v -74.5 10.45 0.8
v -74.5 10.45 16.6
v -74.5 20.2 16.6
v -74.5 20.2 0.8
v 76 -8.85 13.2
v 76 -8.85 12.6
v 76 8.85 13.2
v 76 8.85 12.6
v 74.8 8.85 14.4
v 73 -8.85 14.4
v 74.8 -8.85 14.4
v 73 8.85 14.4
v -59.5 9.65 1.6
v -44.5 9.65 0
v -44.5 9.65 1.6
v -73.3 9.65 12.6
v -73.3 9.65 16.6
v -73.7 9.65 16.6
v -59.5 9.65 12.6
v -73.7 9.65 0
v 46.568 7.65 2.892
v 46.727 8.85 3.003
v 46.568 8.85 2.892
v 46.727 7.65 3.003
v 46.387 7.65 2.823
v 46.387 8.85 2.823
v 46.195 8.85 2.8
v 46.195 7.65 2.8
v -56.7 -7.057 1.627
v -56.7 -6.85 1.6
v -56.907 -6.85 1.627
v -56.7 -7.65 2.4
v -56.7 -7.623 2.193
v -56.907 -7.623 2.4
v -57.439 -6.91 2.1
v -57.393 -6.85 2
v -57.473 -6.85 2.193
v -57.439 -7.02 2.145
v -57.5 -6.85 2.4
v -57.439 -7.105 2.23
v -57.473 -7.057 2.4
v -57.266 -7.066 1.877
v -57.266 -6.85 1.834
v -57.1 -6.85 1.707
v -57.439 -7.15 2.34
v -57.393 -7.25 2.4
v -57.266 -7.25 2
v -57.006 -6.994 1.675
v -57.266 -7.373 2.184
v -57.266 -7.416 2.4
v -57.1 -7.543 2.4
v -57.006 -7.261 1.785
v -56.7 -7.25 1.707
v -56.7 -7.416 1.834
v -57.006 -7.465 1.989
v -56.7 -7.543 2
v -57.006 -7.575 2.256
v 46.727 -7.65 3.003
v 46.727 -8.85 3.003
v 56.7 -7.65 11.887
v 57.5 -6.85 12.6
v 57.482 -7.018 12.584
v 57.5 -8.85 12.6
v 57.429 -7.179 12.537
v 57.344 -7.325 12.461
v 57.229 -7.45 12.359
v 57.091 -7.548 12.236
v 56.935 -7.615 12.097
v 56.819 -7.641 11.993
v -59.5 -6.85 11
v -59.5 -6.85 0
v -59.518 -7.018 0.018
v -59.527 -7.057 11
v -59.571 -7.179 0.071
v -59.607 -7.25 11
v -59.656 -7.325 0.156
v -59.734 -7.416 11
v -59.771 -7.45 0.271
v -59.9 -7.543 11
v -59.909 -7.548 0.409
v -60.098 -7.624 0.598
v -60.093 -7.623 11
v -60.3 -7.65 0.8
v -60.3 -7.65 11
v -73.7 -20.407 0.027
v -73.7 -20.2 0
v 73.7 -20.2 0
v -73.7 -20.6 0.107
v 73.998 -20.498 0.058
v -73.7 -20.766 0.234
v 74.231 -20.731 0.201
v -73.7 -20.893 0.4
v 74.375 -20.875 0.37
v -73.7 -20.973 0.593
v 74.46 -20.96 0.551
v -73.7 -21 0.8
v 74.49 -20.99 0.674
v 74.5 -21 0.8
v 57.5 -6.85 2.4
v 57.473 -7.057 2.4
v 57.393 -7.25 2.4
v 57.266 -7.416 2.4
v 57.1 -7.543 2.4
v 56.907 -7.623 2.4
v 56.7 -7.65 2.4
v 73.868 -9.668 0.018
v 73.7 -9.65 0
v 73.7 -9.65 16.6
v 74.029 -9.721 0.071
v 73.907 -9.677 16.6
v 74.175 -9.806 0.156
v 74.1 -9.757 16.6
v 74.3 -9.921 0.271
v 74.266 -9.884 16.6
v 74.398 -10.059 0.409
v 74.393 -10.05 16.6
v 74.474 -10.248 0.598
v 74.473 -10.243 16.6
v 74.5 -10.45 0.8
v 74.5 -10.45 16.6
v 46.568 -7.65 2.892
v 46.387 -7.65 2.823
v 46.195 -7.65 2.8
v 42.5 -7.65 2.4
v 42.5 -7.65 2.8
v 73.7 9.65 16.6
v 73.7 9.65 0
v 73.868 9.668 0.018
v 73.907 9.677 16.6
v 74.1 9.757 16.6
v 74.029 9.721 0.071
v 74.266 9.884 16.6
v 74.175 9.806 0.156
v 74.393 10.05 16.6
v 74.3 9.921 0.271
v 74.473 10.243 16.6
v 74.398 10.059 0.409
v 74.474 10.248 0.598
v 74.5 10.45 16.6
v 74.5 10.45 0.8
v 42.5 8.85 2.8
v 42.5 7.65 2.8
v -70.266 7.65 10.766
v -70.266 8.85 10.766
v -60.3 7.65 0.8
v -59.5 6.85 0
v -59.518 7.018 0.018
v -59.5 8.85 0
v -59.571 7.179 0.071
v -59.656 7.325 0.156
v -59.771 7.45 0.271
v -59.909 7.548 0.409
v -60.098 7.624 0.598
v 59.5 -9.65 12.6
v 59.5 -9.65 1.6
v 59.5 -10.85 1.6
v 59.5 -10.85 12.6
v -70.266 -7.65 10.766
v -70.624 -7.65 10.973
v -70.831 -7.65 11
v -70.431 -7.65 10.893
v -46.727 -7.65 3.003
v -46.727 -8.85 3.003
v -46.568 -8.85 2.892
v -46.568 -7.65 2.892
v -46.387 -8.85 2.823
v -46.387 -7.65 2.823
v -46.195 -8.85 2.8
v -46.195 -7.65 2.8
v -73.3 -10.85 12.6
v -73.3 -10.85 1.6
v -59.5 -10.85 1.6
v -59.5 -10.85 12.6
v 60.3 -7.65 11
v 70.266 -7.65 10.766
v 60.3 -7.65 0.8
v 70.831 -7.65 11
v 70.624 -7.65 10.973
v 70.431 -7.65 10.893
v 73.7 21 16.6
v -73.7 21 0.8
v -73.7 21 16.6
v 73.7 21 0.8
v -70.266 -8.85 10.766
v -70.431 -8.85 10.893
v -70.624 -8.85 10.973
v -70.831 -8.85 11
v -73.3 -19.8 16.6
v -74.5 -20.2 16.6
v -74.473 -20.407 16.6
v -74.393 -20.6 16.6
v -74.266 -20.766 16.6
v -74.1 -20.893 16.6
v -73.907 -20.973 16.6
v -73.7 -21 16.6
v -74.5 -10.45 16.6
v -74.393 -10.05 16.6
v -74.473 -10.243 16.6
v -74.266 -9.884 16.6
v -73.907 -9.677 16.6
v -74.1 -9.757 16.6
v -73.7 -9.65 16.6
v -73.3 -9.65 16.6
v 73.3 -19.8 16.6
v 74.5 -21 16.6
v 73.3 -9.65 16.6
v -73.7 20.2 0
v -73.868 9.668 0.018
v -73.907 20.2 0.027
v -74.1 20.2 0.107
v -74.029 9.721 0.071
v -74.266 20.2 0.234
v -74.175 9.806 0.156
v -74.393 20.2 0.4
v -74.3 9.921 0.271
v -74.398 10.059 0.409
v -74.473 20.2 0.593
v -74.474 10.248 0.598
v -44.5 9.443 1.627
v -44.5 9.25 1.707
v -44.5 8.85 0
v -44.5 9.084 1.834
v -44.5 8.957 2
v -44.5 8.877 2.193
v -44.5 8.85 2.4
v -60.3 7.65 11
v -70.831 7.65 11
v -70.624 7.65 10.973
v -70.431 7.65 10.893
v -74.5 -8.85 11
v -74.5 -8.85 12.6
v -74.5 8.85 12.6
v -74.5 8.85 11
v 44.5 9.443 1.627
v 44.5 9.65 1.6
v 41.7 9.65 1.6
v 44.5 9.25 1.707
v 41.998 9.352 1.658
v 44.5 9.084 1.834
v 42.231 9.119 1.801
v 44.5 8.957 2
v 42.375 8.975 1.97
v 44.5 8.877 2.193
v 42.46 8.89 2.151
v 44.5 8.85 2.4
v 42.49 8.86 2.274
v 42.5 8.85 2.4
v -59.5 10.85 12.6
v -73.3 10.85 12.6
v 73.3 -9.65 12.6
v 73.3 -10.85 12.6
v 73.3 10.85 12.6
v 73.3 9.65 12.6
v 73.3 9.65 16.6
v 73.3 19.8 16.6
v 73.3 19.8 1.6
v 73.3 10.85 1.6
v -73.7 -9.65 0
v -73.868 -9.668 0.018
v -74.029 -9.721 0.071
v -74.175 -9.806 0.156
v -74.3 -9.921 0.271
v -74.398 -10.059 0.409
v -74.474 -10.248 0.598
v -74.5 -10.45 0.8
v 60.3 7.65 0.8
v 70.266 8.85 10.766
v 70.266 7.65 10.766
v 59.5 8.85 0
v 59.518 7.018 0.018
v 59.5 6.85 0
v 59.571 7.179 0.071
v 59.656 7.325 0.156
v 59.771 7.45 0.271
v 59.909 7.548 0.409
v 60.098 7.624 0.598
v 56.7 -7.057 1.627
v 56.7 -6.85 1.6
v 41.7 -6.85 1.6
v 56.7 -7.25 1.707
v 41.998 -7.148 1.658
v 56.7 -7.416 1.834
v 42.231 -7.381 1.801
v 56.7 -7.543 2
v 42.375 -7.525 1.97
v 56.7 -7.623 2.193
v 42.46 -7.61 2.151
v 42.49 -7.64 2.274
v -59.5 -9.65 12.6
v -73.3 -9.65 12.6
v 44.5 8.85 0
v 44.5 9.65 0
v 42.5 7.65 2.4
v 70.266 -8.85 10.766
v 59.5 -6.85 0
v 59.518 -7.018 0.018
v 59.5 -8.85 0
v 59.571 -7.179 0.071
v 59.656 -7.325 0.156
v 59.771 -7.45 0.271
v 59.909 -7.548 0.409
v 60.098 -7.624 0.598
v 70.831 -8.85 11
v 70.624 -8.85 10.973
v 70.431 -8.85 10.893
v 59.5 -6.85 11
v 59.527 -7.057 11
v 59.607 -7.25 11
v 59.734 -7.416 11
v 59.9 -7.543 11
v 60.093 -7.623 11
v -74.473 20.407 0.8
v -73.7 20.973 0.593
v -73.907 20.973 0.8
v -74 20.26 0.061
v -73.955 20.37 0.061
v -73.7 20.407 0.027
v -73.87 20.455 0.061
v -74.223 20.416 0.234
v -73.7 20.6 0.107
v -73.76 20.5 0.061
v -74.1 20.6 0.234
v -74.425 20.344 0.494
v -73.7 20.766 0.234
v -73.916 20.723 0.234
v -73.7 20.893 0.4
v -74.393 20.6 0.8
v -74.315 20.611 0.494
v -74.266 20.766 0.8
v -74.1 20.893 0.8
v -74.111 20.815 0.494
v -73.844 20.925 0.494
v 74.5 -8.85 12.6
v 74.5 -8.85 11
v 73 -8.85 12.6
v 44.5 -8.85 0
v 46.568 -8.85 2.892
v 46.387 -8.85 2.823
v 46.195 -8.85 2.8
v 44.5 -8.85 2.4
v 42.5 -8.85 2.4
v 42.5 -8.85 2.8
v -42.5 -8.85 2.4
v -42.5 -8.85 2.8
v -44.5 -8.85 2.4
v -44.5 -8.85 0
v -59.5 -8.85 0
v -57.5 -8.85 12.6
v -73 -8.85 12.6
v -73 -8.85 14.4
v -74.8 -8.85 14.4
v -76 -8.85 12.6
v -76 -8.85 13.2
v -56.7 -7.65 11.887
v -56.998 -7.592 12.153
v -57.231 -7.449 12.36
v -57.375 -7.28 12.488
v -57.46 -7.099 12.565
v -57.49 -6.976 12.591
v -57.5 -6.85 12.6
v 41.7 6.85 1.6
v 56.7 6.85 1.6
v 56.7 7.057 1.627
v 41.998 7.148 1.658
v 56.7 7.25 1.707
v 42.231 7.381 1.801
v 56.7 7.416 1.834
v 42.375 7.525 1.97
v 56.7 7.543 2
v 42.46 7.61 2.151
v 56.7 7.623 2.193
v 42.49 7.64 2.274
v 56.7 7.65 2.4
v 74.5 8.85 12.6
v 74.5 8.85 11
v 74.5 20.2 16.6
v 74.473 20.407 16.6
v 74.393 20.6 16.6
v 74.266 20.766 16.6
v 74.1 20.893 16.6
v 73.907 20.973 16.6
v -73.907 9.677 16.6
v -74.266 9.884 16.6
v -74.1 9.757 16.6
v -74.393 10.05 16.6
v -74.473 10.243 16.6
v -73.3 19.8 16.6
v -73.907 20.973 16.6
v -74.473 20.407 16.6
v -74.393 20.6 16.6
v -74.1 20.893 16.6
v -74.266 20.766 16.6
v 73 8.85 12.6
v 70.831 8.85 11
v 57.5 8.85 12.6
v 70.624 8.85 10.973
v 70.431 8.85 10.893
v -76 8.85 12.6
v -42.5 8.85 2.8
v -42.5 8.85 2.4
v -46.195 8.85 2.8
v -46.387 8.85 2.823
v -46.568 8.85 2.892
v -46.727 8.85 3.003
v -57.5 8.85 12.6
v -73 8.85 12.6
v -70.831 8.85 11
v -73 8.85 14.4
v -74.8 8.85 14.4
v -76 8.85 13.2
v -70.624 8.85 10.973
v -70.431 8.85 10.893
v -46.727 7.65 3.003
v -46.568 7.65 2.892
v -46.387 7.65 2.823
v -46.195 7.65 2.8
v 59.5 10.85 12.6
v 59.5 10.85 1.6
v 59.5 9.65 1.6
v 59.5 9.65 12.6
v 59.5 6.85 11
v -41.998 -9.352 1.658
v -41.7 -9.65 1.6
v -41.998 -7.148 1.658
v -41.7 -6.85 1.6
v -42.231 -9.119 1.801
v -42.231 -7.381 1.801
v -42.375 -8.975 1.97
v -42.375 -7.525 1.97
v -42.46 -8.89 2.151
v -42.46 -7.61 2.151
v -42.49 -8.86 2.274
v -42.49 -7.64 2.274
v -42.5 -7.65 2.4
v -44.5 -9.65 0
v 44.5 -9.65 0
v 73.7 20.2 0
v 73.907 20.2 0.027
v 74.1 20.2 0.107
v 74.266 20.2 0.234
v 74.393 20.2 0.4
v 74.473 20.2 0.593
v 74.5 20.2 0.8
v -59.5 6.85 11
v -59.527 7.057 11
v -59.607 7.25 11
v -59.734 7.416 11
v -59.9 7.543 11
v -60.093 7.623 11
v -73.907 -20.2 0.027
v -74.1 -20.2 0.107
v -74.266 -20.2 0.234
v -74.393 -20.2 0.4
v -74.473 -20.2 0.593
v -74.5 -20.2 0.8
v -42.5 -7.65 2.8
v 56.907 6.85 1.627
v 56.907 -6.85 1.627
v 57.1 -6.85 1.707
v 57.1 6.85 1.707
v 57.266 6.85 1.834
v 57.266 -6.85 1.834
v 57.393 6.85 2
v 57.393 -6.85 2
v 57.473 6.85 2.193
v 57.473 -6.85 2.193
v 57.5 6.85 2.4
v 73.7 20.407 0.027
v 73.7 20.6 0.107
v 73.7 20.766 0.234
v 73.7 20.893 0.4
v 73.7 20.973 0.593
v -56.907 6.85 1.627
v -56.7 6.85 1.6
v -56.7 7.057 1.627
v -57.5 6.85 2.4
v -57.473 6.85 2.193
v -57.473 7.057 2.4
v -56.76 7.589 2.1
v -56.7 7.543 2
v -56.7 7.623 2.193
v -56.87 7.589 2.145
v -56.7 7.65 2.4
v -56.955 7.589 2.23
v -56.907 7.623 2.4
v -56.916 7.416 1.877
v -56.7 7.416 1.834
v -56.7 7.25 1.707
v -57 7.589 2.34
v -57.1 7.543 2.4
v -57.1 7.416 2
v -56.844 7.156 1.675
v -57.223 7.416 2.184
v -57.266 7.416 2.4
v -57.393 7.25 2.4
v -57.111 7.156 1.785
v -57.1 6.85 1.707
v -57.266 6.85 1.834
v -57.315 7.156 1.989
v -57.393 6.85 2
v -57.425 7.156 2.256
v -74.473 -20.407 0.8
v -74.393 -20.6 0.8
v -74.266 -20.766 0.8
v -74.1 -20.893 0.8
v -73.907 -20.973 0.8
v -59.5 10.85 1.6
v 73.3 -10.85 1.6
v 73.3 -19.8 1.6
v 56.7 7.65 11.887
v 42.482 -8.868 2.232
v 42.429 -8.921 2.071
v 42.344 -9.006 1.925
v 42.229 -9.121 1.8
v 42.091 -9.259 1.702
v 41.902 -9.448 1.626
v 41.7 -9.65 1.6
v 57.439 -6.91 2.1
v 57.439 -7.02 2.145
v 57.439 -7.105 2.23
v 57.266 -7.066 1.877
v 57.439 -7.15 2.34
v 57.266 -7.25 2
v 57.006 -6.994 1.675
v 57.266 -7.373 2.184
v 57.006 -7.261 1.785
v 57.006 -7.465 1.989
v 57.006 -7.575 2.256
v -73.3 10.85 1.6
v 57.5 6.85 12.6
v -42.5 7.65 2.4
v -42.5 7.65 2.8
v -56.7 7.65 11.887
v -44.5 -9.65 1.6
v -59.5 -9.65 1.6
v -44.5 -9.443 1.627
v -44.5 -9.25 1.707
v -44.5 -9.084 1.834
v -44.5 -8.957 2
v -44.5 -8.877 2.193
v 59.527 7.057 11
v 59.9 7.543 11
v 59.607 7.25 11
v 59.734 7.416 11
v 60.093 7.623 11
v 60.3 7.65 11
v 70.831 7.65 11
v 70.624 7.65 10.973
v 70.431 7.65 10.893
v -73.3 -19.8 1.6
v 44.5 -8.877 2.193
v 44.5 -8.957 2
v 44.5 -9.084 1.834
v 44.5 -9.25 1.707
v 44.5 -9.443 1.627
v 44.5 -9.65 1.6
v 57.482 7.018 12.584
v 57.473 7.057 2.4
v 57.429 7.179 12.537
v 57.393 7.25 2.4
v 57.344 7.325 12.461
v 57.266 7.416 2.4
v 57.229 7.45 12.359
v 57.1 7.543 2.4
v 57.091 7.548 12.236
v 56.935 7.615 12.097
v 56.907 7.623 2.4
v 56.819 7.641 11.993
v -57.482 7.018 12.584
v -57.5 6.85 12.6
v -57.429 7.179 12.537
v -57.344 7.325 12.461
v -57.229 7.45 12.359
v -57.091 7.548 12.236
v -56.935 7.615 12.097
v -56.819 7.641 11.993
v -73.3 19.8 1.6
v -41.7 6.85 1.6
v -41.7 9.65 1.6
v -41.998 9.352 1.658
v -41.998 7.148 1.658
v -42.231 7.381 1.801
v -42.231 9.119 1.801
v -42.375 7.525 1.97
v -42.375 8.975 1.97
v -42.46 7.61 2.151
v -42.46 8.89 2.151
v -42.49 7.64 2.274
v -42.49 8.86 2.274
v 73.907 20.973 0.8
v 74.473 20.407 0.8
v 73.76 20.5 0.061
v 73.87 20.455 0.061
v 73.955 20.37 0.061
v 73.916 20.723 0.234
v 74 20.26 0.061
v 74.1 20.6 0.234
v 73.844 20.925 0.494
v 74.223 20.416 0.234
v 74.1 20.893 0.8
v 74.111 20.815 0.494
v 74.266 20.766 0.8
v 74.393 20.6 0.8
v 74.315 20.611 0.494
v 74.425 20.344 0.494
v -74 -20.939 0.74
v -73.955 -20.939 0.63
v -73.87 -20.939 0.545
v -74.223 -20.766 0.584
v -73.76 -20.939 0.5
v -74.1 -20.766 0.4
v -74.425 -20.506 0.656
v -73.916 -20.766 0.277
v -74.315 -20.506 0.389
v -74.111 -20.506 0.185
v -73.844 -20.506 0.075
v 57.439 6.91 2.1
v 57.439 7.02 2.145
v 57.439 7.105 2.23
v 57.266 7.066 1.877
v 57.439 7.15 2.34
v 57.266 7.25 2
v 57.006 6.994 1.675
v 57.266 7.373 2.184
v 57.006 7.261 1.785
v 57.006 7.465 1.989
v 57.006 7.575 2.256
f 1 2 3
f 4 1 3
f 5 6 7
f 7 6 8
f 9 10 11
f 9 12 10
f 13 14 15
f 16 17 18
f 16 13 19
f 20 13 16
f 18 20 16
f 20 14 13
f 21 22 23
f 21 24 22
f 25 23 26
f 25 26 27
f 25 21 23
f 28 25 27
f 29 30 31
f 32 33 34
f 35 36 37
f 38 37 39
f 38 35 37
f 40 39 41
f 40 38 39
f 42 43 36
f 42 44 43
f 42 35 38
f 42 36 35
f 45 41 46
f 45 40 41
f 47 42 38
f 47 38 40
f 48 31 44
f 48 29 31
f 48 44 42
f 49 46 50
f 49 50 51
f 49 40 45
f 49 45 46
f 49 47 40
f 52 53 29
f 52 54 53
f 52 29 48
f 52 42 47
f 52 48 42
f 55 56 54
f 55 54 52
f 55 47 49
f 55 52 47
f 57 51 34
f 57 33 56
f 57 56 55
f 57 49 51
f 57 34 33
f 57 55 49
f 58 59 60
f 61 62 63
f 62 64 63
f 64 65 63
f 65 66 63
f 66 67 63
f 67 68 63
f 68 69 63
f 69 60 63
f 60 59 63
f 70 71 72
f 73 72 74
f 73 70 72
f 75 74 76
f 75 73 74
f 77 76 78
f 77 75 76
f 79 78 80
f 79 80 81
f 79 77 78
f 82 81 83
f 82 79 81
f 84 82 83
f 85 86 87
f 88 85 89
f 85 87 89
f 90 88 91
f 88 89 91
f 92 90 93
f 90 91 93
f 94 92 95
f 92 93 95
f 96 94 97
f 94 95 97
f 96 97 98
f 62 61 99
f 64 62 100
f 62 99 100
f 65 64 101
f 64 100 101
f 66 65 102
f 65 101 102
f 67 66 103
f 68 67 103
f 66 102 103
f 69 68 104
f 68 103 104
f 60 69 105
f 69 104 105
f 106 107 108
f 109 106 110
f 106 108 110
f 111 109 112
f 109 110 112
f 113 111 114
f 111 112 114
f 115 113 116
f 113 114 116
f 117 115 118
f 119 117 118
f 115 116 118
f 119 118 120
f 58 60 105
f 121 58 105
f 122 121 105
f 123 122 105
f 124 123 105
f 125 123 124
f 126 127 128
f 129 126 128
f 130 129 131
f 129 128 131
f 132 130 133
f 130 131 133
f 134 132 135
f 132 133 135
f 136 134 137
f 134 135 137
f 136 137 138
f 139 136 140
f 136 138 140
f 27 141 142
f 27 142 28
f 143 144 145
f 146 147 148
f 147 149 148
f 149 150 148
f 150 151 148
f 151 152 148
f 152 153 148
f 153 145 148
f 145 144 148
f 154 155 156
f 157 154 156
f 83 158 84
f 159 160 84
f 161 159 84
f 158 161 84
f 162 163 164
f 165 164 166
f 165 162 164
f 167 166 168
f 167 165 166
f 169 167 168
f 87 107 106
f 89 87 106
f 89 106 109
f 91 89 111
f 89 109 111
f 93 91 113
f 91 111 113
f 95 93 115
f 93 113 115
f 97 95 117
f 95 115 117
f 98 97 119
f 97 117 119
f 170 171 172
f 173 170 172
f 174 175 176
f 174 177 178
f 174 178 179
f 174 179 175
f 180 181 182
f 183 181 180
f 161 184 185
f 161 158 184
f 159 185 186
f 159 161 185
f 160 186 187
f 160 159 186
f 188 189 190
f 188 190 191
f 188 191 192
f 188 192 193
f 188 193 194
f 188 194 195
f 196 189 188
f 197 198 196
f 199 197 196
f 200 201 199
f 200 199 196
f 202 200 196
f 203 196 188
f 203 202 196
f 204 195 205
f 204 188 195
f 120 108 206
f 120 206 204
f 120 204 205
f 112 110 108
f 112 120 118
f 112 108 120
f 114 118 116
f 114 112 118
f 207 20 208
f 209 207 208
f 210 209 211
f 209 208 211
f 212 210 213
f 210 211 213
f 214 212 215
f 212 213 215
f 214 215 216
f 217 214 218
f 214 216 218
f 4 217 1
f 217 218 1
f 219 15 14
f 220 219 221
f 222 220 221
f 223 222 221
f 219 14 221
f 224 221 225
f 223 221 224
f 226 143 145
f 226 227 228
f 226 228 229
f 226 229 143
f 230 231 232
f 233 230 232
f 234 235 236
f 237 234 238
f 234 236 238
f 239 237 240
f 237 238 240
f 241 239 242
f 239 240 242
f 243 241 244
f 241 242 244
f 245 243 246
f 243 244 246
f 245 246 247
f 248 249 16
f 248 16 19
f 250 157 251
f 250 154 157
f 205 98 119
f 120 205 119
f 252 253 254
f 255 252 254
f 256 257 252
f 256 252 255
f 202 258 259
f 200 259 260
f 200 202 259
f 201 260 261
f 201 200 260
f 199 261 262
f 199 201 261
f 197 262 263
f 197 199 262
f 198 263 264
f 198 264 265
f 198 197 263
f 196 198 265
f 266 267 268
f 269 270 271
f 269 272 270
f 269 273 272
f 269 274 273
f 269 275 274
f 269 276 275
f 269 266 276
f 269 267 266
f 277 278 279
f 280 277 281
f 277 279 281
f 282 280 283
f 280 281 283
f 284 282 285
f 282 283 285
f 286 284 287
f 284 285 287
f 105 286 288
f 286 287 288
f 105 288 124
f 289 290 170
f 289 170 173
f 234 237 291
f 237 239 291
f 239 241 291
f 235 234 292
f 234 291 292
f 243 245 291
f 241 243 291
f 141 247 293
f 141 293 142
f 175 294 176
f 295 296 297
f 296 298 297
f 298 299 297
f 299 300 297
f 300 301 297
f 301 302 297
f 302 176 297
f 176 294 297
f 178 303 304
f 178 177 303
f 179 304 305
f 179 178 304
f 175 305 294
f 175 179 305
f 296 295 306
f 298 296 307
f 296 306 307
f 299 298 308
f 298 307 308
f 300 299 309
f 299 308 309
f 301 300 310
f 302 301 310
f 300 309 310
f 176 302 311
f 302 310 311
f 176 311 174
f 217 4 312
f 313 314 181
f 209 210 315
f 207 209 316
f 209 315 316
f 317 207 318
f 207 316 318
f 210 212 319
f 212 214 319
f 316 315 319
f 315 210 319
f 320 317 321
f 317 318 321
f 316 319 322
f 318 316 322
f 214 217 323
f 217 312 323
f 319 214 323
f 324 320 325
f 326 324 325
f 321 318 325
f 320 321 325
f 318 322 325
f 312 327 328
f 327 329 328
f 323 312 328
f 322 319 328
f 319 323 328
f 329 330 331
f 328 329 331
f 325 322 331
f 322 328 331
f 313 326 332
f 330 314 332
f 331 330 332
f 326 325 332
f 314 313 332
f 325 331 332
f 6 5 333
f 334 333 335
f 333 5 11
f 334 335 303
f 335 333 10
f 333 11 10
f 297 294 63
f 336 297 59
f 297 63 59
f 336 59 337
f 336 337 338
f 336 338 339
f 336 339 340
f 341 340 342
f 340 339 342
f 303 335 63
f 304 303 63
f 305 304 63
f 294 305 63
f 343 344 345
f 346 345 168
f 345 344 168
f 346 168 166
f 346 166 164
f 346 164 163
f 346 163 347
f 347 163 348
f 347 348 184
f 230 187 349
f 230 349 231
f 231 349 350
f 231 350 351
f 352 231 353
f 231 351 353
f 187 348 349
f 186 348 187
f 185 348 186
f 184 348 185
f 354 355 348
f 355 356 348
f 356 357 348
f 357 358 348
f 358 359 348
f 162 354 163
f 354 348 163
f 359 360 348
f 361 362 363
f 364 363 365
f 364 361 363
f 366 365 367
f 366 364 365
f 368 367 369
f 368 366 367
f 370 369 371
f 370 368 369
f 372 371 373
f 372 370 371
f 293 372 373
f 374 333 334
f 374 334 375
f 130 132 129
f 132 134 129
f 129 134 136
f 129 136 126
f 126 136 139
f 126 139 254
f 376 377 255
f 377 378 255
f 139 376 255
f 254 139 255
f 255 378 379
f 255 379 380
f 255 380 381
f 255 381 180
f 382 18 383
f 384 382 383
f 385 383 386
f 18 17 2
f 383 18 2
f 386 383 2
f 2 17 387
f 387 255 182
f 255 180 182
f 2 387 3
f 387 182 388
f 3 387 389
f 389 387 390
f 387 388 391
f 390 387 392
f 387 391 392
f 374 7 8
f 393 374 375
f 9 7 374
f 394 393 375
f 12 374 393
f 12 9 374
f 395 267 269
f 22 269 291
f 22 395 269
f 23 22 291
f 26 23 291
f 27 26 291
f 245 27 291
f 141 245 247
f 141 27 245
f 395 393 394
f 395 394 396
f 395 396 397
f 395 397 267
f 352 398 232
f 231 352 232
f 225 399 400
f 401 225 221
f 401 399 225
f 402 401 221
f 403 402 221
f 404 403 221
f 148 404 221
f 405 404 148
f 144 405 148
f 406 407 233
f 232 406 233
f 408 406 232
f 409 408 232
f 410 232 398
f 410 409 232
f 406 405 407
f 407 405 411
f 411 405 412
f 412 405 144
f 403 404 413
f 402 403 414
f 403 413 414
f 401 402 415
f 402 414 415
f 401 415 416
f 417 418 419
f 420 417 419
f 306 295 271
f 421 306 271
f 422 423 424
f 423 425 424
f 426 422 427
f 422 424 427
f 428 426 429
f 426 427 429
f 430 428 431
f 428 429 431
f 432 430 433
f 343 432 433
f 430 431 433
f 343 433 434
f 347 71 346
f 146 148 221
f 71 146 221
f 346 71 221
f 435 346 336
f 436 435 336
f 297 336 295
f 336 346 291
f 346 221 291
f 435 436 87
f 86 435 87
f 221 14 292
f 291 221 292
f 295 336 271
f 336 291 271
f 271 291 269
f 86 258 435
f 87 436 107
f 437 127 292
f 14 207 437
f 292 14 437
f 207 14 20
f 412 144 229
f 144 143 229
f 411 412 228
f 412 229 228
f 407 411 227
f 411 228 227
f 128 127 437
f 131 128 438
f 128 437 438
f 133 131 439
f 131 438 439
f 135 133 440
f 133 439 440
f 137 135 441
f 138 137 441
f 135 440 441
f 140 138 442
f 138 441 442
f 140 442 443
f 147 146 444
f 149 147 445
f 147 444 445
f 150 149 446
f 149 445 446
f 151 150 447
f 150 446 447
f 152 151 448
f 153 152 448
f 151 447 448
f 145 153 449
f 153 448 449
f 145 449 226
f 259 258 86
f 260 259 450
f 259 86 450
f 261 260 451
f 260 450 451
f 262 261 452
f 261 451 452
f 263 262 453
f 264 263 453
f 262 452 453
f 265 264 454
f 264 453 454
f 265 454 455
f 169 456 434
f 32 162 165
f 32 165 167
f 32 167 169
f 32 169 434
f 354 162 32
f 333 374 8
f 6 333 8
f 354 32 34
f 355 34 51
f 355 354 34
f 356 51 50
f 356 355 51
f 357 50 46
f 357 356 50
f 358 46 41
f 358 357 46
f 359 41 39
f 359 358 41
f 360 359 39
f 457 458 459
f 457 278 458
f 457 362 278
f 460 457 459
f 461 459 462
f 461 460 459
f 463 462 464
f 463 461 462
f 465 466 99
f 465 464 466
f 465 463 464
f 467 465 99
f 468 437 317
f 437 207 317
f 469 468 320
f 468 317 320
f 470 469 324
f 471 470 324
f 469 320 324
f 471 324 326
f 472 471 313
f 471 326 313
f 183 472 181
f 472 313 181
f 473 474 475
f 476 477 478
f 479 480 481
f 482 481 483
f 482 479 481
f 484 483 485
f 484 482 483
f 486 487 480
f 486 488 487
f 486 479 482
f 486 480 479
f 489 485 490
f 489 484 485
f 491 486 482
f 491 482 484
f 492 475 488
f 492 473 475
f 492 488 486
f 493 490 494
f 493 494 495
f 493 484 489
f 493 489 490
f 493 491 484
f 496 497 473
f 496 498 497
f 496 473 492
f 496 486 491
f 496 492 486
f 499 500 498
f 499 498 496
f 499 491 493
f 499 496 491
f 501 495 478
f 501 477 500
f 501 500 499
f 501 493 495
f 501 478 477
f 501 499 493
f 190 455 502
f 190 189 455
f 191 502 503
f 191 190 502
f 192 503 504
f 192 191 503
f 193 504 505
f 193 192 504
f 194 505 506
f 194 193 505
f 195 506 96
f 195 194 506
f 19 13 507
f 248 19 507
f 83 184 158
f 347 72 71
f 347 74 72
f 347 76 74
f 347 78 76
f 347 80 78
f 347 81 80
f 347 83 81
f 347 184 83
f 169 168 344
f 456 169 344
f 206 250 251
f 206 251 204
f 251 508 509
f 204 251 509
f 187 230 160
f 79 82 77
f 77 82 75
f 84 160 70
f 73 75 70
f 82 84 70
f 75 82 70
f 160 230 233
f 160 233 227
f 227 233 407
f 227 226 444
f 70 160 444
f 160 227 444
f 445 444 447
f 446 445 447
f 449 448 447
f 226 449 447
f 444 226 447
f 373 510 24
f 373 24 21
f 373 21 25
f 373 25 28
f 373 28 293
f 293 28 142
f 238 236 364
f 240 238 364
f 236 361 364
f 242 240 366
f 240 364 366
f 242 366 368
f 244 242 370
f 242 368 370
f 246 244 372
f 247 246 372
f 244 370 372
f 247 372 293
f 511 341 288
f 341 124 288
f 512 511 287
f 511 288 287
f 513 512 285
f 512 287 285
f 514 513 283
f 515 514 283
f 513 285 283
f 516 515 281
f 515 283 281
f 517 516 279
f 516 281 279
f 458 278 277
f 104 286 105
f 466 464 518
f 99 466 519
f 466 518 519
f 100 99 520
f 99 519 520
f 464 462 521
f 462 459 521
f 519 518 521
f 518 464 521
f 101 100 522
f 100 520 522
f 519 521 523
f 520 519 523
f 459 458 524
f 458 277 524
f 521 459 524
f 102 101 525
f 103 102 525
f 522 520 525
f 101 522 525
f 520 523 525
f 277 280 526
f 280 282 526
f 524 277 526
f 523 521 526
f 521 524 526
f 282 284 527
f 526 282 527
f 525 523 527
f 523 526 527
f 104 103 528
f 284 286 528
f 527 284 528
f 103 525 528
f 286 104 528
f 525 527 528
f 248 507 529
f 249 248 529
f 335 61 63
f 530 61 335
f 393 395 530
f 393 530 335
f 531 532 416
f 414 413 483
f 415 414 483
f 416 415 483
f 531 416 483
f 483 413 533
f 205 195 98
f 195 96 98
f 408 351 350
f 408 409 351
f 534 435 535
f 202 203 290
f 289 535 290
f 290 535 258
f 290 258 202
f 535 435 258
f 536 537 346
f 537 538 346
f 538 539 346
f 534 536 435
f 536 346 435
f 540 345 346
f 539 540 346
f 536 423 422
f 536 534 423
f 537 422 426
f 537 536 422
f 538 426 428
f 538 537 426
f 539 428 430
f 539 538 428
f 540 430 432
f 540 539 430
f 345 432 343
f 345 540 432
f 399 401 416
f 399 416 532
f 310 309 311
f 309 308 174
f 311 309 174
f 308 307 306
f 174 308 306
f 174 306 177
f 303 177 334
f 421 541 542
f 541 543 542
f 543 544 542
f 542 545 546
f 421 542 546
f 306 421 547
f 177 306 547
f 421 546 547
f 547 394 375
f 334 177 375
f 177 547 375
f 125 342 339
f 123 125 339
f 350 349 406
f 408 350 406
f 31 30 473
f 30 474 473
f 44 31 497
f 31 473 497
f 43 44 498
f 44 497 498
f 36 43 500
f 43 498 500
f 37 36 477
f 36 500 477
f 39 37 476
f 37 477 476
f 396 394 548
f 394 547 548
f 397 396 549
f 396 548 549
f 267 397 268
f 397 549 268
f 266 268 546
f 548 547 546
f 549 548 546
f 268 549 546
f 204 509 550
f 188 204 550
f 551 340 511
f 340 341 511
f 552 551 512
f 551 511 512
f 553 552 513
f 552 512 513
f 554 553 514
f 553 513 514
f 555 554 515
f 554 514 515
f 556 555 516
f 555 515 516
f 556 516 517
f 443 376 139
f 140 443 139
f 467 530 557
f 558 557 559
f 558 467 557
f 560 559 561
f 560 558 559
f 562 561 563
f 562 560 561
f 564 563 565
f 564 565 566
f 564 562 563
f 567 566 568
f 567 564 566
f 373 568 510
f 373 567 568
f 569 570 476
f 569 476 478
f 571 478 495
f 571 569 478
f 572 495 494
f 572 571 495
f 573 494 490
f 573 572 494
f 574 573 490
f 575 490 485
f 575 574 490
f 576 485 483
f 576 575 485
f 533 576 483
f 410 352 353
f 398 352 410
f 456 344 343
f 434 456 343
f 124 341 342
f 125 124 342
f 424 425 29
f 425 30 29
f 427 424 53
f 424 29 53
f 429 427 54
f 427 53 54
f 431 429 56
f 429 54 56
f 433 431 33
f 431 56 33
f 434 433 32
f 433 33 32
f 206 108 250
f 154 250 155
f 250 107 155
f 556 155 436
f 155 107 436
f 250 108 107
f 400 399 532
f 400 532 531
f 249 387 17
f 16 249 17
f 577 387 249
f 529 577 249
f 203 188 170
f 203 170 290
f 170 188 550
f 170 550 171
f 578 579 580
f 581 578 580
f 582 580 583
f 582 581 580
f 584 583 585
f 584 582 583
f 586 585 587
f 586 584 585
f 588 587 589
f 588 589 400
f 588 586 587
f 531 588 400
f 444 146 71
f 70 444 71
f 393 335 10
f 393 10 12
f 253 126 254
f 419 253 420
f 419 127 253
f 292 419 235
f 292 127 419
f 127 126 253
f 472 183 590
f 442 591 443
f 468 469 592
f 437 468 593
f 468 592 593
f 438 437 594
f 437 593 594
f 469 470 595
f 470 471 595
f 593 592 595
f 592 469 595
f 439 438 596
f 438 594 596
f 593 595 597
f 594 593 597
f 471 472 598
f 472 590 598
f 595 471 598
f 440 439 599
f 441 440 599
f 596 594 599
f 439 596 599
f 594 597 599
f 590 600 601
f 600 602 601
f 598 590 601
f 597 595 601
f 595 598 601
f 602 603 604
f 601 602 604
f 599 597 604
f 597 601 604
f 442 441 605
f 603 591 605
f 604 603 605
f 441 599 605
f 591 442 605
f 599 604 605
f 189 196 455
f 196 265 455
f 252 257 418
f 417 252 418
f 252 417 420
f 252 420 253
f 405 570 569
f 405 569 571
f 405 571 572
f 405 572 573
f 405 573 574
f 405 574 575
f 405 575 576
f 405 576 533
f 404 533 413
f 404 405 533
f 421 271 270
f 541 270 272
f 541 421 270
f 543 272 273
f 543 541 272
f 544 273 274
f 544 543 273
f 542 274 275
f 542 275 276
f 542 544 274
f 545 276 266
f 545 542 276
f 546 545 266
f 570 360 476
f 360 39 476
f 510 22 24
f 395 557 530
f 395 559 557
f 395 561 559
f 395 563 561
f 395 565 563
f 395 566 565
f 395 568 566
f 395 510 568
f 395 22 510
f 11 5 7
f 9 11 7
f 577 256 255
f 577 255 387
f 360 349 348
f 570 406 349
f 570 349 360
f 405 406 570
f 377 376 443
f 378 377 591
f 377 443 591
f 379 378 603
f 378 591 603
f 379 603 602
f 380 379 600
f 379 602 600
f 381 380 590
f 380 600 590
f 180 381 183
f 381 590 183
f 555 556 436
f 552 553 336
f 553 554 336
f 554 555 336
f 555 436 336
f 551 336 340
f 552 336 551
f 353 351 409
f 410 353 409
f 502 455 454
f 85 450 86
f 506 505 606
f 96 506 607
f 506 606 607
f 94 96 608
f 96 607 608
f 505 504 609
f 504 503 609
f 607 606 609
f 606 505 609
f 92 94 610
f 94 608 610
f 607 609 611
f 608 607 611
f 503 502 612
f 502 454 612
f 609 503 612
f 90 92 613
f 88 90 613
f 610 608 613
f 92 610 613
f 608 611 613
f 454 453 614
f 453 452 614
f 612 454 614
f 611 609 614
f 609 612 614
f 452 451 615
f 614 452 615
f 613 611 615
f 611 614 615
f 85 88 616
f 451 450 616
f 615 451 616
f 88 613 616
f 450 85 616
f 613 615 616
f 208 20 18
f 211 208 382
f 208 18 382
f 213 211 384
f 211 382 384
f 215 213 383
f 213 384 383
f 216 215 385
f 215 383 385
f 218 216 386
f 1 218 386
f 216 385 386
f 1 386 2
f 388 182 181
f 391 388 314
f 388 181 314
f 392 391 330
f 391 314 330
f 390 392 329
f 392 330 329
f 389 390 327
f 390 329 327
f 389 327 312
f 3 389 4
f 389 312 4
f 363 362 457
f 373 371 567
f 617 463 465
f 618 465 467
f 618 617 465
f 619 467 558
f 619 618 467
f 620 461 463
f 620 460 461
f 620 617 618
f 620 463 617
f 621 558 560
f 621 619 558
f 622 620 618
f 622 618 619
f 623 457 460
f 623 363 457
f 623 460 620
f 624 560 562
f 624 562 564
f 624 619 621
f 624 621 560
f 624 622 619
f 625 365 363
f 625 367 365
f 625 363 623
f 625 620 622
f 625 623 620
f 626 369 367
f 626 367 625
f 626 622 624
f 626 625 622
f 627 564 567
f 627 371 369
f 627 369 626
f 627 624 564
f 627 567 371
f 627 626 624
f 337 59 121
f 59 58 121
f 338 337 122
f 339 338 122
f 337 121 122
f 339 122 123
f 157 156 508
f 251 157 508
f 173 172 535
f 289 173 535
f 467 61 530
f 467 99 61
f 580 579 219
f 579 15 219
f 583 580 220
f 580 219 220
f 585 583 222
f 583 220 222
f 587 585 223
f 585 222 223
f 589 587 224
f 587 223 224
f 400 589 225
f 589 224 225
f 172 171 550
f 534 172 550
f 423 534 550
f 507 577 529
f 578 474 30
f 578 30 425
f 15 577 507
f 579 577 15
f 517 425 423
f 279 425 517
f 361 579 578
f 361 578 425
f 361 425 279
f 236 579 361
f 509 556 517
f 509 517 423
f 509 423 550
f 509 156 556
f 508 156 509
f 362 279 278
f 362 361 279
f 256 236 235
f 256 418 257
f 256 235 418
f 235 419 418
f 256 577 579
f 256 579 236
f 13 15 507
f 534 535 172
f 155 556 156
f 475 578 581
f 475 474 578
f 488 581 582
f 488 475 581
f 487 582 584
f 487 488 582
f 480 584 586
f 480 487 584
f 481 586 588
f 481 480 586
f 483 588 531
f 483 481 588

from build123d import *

# Parameters (mm, degrees)
PAD_DEPTH    = 1.6
SKETCH002_W  = 2
SKETCH002_H  = 17.7
PAD001_DEPTH = 11
PAD002_DEPTH = 4
SKETCH004_W  = 15
SKETCH004_H  = 17.7
PAD003_DEPTH = 1.6
SKETCH005_W  = 3
SKETCH005_H  = 17.7
PAD004_DEPTH = 1.8
PAD005_DEPTH = 1.2
PAD006_DEPTH = 1.2
CHAMFER_SIZE = 1.2
FILLET_R     = 0.8


with BuildPart() as part:
    # Sketch001 → Pad (new body)
    with BuildSketch(Plane.XY):
        Polygon((-44.5, -9.65), (-74.5, -9.65), (-74.5, -21), (74.5, -21), (74.5, -9.65), (44.5, -9.65), (44.5, -8.85), (59.5, -8.85), (59.5, 8.85), (44.5, 8.85), (44.5, 9.65), (74.5, 9.65), (74.5, 21), (-74.5, 21), (-74.5, 9.65), (-44.5, 9.65), (-44.5, 8.85), (-59.5, 8.85), (-59.5, -8.85), (-44.5, -8.85), align=None)
    extrude(amount=PAD_DEPTH)

    # Sketch002 → Pad001 (join)
    with BuildSketch(Plane.XY.offset(1.6)):
        Polygon((59.5, 9.65), (74.5, 9.65), (74.5, 21), (-74.5, 21), (-74.5, 9.65), (-59.5, 9.65), (-59.5, 10.85), (-73.3, 10.85), (-73.3, 19.8), (73.3, 19.8), (73.3, 10.85), (59.5, 10.85), align=None)
        Polygon((-59.5, -9.65), (-74.5, -9.65), (-74.5, -21), (74.5, -21), (74.5, -9.65), (59.5, -9.65), (59.5, -10.85), (73.3, -10.85), (73.3, -19.8), (-73.3, -19.8), (-73.3, -10.85), (-59.5, -10.85), align=None)
        with Locations((-58.5, 0)):
            Rectangle(SKETCH002_W, SKETCH002_H)
        with Locations((58.5, 0)):
            Rectangle(SKETCH002_W, SKETCH002_H)
    extrude(amount=PAD001_DEPTH)

    # Sketch003 → Pad002 (join)
    with BuildSketch(Plane.XY.offset(12.6)):
        Polygon((-74.5, 9.65), (-74.5, 21), (74.5, 21), (74.5, 9.65), (73.3, 9.65), (73.3, 19.8), (-73.3, 19.8), (-73.3, 9.65), align=None)
        Polygon((-74.5, -9.65), (-74.5, -21), (74.5, -21), (74.5, -9.65), (73.3, -9.65), (73.3, -19.8), (-73.3, -19.8), (-73.3, -9.65), align=None)
    extrude(amount=PAD002_DEPTH)

    # Sketch004 → Pad003 (join)
    with BuildSketch(Plane.XY.offset(12.6)):
        with Locations((-67, 0)):
            Rectangle(SKETCH004_W, SKETCH004_H)
        with Locations((67, 0)):
            Rectangle(SKETCH004_W, SKETCH004_H)
    extrude(amount=-PAD003_DEPTH)

    # Sketch005 → Pad004 (join)
    with BuildSketch(Plane.XY.offset(12.6)):
        with Locations((-74.5, 0)):
            Rectangle(SKETCH005_W, SKETCH005_H)
        with Locations((74.5, 0)):
            Rectangle(SKETCH005_W, SKETCH005_H)
    extrude(amount=PAD004_DEPTH)

    # Sketch006 (on DatumPlane) → Pad005 (join)
    with BuildSketch(Plane(origin=(59.5, 8.85, 0), x_dir=(-1, 0, 0), z_dir=(0, 1, 0))):
        Polygon((2, 1.6), (17, 1.6), (17, 2.8), (13, 2.8), (2, 12.6), align=None)
        Polygon((0, 0), (0, 11), (-11, 11), align=None)
        Polygon((119, 0), (119, 11), (130, 11), align=None)
        Polygon((102, 1.6), (117, 1.6), (117, 12.6), (106, 2.8), (102, 2.8), align=None)
    extrude(amount=-PAD005_DEPTH)

    # Sketch007 (on DatumPlane) → Pad006 (join)
    with BuildSketch(Plane(origin=(59.5, -8.85, 0), x_dir=(-1, 0, 0), z_dir=(0, 1, 0))):
        Polygon((2, 1.6), (17, 1.6), (17, 2.8), (13, 2.8), (2, 12.6), align=None)
        Polygon((0, 0), (0, 11), (-11, 11), align=None)
        Polygon((119, 0), (119, 11), (130, 11), align=None)
        Polygon((102, 1.6), (117, 1.6), (117, 12.6), (106, 2.8), (102, 2.8), align=None)
    extrude(amount=PAD006_DEPTH)

    # Chamfer
    chamfer_edges = [part.edges().sort_by_distance(p)[0] for p in [
        (76, 0, 14.4),
        (-76, 0, 14.4),
    ]]
    chamfer(chamfer_edges, length=CHAMFER_SIZE)

    # Fillet
    fillet_edges = [part.edges().sort_by_distance(p)[0] for p in [
        (43.5, 8.85, 1.6),
        (-43.5, 8.85, 1.6),
        (-42.5, 8.25, 1.6),
        (-42.5, -8.25, 1.6),
        (-50, -7.65, 1.6),
        (-57.5, 0, 1.6),
        (50, -7.65, 1.6),
        (42.5, 8.25, 1.6),
        (50, 7.65, 1.6),
        (57.5, 0, 1.6),
        (42.5, -8.25, 1.6),
        (43.5, -8.85, 1.6),
        (-43.5, -8.85, 1.6),
        (-50, 7.65, 1.6),
        (74.5, 21, 8.3),
        (-74.5, 21, 8.3),
        (-74.5, 15.325, 0),
        (-74.5, 9.65, 8.3),
        (-74.5, -9.65, 8.3),
        (-74.5, -15.325, 0),
        (-74.5, -21, 8.3),
        (0, 21, 0),
        (0, -21, 0),
        (-59.5, 7.65, 5.5),
        (-59.5, -7.65, 5.5),
        (74.5, 15.325, 0),
        (74.5, 9.65, 8.3),
        (74.5, -15.325, 0),
        (74.5, -9.65, 8.3),
        (59.5, 7.65, 5.5),
        (59.5, -7.65, 5.5),
        (70.5, -8.25, 11),
        (70.5, 8.25, 11),
        (-70.5, 8.25, 11),
        (-70.5, -8.25, 11),
        (-57.5, 7.65, 7.1),
        (57.5, 7.65, 7.1),
        (57.5, -7.65, 7.1),
        (-57.5, -7.65, 7.1),
        (-46.5, -8.25, 2.8),
        (-46.5, 8.25, 2.8),
        (46.5, 8.25, 2.8),
        (46.5, -8.25, 2.8),
    ]]
    fillet(fillet_edges, radius=FILLET_R)


solid = part.part
